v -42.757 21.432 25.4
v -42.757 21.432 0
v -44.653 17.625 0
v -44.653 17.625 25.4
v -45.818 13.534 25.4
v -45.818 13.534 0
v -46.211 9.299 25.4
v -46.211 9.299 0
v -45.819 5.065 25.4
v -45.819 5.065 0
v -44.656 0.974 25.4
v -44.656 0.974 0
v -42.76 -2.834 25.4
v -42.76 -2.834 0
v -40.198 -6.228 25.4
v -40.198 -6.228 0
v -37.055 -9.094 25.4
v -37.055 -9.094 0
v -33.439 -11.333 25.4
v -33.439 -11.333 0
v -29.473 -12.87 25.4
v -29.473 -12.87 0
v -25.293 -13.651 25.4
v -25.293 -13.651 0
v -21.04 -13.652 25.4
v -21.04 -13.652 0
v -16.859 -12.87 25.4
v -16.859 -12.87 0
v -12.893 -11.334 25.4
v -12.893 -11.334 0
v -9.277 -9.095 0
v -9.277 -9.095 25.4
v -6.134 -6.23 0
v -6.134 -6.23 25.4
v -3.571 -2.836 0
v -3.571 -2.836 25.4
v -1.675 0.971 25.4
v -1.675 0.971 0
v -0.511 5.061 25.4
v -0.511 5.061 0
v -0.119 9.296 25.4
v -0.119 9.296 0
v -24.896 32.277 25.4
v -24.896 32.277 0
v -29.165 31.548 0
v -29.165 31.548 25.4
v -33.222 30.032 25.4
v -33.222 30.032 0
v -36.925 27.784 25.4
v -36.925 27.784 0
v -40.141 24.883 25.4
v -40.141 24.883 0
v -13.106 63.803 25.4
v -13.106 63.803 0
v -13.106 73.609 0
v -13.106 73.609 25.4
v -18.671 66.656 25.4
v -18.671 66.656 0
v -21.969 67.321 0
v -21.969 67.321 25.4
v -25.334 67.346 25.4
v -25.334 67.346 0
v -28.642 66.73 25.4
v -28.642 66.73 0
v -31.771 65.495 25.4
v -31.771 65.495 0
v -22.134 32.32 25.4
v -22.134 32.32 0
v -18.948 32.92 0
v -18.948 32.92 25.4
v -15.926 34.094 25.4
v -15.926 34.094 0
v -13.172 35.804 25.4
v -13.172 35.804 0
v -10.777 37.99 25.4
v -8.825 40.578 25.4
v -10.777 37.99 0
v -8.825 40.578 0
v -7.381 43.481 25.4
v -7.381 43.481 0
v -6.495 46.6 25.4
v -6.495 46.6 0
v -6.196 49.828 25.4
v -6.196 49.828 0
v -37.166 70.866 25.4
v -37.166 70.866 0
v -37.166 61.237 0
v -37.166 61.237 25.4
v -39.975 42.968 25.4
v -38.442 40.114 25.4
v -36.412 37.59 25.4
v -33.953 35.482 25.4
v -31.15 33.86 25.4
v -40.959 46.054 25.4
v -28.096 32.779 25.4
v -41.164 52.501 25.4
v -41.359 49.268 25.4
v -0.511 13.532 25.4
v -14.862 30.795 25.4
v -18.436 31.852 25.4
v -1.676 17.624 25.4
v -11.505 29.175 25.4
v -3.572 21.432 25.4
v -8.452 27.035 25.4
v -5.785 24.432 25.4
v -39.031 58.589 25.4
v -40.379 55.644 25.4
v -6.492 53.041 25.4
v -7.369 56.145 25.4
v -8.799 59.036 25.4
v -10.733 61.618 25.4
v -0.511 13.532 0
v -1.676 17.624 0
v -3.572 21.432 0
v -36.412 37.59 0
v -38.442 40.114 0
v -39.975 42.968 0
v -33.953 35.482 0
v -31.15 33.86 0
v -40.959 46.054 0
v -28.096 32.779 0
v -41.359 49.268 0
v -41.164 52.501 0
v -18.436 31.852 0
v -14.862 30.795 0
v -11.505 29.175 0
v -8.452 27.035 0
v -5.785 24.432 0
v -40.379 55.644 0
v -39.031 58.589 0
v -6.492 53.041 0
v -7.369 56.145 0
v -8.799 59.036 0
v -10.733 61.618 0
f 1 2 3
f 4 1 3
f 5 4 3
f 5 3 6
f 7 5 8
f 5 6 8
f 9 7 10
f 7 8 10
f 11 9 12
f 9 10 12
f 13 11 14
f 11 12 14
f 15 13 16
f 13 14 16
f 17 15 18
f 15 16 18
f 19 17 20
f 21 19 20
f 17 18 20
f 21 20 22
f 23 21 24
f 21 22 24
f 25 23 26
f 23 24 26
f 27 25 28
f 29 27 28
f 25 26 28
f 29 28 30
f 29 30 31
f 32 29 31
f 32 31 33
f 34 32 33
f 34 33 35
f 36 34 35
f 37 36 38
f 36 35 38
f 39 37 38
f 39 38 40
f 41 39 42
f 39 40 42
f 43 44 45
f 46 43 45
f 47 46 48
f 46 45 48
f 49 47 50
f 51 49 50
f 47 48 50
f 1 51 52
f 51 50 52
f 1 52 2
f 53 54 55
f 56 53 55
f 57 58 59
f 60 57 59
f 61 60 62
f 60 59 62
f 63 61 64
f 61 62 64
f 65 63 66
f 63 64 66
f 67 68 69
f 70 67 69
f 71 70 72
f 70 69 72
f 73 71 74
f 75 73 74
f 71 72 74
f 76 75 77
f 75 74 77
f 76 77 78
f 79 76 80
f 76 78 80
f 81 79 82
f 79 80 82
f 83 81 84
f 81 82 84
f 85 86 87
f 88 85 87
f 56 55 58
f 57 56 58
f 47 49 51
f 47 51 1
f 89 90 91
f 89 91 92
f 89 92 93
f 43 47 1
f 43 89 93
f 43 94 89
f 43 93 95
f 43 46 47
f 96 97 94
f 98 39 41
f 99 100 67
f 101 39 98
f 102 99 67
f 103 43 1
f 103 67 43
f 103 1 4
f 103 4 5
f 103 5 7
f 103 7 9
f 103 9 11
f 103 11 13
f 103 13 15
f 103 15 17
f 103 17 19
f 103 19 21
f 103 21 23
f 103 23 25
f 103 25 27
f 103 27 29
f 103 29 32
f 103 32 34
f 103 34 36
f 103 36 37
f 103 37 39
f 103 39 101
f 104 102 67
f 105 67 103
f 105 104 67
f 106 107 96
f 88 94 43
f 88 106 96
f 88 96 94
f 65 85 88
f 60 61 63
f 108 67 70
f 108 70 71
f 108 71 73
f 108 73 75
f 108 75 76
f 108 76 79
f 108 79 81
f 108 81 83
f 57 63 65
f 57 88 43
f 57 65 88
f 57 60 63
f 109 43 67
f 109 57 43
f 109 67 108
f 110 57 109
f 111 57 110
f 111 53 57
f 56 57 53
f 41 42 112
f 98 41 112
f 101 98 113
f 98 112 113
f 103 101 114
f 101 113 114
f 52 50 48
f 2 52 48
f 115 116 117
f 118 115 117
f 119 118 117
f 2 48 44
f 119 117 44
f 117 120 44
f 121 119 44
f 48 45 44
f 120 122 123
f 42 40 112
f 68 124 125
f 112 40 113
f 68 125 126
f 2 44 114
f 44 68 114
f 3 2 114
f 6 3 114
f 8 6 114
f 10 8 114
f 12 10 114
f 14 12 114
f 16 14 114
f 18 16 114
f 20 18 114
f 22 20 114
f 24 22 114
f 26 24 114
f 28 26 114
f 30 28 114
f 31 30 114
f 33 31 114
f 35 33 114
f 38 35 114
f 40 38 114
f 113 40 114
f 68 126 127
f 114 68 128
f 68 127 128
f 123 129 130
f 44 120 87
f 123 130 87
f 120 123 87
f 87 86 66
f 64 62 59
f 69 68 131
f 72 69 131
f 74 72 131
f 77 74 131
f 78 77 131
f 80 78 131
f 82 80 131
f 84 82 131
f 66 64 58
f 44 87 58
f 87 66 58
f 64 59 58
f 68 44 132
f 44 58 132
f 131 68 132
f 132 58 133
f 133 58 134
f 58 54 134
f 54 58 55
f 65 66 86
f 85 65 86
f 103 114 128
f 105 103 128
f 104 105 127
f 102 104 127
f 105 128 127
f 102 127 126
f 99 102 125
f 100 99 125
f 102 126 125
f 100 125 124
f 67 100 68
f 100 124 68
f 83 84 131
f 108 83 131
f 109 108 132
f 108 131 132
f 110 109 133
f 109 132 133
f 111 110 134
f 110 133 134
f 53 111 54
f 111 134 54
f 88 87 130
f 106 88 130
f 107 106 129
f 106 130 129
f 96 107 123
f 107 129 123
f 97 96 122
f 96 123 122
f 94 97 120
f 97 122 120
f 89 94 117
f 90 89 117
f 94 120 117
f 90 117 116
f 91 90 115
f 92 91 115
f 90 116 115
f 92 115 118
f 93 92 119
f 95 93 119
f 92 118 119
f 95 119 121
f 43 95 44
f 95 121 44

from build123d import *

# Parameters (mm, degrees)
F0_R     = 3.3666282328
F0_R_2   = 4.2780726565
F1_DEPTH = 25.4


with BuildPart() as f1:
    # F0 (on Top) → F1 (new body)
    with BuildSketch(Plane.XY):
        with BuildLine():
            ThreePointArc((-22.1343814945, 32.3195395849), (-10.7773284043, 37.9899650978), (-6.1959977362, 49.8283682714))
            ThreePointArc((-6.1959977362, 49.8283682714), (-8.017979687, 57.6234855899), (-13.1064001471, 63.8034086848))
            ThreePointArc((-13.1064001471, 63.8034086848), (-15.7610771081, 65.4788003499), (-18.6713267733, 66.6555305166))
            ThreePointArc((-18.6713267733, 66.6555305166), (-25.3338728535, 67.3459786854), (-31.771318173, 65.4951581371))
            ThreePointArc((-31.771318173, 65.4951581371), (-34.6785879171, 63.6321004456), (-37.1657780069, 61.236878789))
            ThreePointArc((-37.1657780069, 61.236878789), (-39.9749449815, 42.9676641594), (-24.8959708176, 32.2774742434))
            ThreePointArc((-24.8959708176, 32.2774742434), (-23.515806874, 32.3399135434), (-22.1343814945, 32.3195395849))
        make_face()
        with Locations((-33.5280001163, 56.845203042)):
            Circle(F0_R, mode=Mode.SUBTRACT)
        with Locations((-18.897600472, 56.845203042)):
            Circle(F0_R_2, mode=Mode.SUBTRACT)
        with BuildLine():
            ThreePointArc((-18.6713267733, 66.6555305166), (-15.7610771081, 65.4788003499), (-13.1064001471, 63.8034086848))
            Line((-13.1064001471, 63.8034086848), (-13.1064001471, 73.6092031002))
            Line((-13.1064001471, 73.6092031002), (-18.6713267733, 66.6555305166))
        make_face()
        with BuildLine():
            ThreePointArc((-3.572438767, 21.4317220567), (-11.5045727225, 29.1751773236), (-22.1343814945, 32.3195395849))
            ThreePointArc((-22.1343814945, 32.3195395849), (-23.5143490847, 32.2442096875), (-24.8959708176, 32.2774742434))
            ThreePointArc((-24.8959708176, 32.2774742434), (-35.1264416512, 28.9952801275), (-42.7571638322, 21.4317220567))
            ThreePointArc((-42.7571638322, 21.4317220567), (-29.4734249224, -12.8695185824), (-0.1186150736, 9.2964004725))
            ThreePointArc((-0.1186150736, 9.2964004725), (-0.9988822447, 15.6050240953), (-3.572438767, 21.4317220567))
        make_face()
        with BuildLine():
            ThreePointArc((-24.8959708176, 32.2774742434), (-23.5143490847, 32.2442096875), (-22.1343814945, 32.3195395849))
            ThreePointArc((-22.1343814945, 32.3195395849), (-23.515806874, 32.3399135434), (-24.8959708176, 32.2774742434))
        make_face()
        with BuildLine():
            ThreePointArc((-37.1657780069, 61.236878789), (-34.6785879171, 63.6321004456), (-31.771318173, 65.4951581371))
            Line((-31.771318173, 65.4951581371), (-37.1657780069, 70.8660041886))
            Line((-37.1657780069, 70.8660041886), (-37.1657780069, 61.236878789))
        make_face()
        with Locations((-33.5280001163, 56.845203042)):
            Circle(F0_R)
        with Locations((-18.897600472, 56.845203042)):
            Circle(F0_R_2)
    extrude(amount=F1_DEPTH)


solid = f1.part
